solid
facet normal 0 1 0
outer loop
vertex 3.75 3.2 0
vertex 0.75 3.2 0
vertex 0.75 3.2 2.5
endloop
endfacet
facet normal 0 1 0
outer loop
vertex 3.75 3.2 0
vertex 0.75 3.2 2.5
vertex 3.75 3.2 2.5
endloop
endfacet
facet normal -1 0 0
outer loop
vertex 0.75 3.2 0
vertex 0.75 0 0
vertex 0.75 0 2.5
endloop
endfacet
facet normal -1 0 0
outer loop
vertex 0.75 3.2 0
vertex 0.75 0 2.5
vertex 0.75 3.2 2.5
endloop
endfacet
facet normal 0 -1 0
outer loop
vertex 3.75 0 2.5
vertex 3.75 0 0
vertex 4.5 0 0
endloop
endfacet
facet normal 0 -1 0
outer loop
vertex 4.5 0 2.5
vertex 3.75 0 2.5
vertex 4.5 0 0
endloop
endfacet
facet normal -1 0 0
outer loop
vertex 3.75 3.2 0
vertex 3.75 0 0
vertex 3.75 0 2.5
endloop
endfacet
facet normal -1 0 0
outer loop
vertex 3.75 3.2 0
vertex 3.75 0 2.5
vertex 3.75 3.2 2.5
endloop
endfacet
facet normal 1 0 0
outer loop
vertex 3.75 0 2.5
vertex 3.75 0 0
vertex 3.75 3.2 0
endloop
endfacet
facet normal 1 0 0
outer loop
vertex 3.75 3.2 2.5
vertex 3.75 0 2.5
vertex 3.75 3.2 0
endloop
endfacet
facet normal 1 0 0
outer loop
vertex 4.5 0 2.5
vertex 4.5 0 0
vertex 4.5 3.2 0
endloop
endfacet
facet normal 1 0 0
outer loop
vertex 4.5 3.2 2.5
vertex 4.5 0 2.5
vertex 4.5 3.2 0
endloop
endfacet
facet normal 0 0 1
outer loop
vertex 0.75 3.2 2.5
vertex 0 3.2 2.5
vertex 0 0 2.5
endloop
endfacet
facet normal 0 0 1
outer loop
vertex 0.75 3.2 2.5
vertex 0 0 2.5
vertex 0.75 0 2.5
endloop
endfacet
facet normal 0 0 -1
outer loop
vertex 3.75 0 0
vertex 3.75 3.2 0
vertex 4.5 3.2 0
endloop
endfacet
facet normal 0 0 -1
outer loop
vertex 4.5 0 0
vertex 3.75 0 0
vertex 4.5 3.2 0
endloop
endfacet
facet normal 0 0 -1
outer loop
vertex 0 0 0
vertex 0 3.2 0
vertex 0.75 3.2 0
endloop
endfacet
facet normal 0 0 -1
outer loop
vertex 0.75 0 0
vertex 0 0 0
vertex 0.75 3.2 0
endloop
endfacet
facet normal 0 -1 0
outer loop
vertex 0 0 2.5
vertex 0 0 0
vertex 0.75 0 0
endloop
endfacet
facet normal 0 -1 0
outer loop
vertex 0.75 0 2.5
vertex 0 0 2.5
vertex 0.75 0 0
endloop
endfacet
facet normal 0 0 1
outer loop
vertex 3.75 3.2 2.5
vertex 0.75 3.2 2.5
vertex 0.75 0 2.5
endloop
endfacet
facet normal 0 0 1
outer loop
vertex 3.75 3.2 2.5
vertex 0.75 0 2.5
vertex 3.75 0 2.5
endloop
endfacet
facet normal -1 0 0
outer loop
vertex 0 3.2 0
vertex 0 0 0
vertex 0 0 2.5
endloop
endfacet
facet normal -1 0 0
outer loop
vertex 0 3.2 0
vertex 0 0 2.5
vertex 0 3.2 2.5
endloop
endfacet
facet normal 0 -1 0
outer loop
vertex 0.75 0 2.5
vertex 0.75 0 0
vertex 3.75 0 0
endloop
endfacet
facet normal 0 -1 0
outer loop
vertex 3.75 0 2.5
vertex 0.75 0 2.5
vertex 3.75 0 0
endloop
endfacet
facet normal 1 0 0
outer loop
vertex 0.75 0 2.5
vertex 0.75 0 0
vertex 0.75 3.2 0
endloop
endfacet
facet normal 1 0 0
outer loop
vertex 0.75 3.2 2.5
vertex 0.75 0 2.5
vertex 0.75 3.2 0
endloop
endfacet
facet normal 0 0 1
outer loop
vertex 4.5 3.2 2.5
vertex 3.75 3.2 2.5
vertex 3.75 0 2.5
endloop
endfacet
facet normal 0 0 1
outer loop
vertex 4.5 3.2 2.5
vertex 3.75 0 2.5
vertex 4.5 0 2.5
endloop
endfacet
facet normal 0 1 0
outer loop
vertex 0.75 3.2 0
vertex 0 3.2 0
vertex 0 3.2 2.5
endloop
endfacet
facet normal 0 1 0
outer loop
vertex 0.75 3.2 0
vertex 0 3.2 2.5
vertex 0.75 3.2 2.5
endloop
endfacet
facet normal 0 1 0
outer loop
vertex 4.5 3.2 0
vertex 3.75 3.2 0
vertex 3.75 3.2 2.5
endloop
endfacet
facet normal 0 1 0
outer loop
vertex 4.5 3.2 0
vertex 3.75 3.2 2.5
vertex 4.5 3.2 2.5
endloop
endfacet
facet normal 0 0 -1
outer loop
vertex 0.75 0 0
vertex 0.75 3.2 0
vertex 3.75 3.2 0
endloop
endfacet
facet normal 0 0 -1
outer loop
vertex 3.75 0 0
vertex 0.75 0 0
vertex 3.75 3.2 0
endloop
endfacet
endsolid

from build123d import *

# Parameters (mm, degrees)
BOX_W        = 0.75
BOX_H        = 3.2
BOX_DEPTH    = 2.5
BOX001_W     = 3
BOX001_H     = 3.2
BOX001_DEPTH = 2.5
BOX002_W     = 0.75
BOX002_H     = 3.2
BOX002_DEPTH = 2.5


with BuildPart() as pad001:
    # Box → Box (new body)
    with BuildSketch(Plane.XY):
        with Locations((0.375, 1.6)):
            Rectangle(BOX_W, BOX_H)
    extrude(amount=BOX_DEPTH)


with BuildPart() as corpo:
    # Box001 → Box001 (new body)
    with BuildSketch(Plane(origin=(0.75, 0, 0), x_dir=(1, 0, 0), z_dir=(0, 0, 1))):
        with Locations((1.5, 1.6)):
            Rectangle(BOX001_W, BOX001_H)
    extrude(amount=BOX001_DEPTH)


with BuildPart() as pad002:
    # Box002 → Box002 (new body)
    with BuildSketch(Plane(origin=(3.75, 0, 0), x_dir=(1, 0, 0), z_dir=(0, 0, 1))):
        with Locations((0.375, 1.6)):
            Rectangle(BOX002_W, BOX002_H)
    extrude(amount=BOX002_DEPTH)


solid = Compound([pad001.part, corpo.part, pad002.part])
